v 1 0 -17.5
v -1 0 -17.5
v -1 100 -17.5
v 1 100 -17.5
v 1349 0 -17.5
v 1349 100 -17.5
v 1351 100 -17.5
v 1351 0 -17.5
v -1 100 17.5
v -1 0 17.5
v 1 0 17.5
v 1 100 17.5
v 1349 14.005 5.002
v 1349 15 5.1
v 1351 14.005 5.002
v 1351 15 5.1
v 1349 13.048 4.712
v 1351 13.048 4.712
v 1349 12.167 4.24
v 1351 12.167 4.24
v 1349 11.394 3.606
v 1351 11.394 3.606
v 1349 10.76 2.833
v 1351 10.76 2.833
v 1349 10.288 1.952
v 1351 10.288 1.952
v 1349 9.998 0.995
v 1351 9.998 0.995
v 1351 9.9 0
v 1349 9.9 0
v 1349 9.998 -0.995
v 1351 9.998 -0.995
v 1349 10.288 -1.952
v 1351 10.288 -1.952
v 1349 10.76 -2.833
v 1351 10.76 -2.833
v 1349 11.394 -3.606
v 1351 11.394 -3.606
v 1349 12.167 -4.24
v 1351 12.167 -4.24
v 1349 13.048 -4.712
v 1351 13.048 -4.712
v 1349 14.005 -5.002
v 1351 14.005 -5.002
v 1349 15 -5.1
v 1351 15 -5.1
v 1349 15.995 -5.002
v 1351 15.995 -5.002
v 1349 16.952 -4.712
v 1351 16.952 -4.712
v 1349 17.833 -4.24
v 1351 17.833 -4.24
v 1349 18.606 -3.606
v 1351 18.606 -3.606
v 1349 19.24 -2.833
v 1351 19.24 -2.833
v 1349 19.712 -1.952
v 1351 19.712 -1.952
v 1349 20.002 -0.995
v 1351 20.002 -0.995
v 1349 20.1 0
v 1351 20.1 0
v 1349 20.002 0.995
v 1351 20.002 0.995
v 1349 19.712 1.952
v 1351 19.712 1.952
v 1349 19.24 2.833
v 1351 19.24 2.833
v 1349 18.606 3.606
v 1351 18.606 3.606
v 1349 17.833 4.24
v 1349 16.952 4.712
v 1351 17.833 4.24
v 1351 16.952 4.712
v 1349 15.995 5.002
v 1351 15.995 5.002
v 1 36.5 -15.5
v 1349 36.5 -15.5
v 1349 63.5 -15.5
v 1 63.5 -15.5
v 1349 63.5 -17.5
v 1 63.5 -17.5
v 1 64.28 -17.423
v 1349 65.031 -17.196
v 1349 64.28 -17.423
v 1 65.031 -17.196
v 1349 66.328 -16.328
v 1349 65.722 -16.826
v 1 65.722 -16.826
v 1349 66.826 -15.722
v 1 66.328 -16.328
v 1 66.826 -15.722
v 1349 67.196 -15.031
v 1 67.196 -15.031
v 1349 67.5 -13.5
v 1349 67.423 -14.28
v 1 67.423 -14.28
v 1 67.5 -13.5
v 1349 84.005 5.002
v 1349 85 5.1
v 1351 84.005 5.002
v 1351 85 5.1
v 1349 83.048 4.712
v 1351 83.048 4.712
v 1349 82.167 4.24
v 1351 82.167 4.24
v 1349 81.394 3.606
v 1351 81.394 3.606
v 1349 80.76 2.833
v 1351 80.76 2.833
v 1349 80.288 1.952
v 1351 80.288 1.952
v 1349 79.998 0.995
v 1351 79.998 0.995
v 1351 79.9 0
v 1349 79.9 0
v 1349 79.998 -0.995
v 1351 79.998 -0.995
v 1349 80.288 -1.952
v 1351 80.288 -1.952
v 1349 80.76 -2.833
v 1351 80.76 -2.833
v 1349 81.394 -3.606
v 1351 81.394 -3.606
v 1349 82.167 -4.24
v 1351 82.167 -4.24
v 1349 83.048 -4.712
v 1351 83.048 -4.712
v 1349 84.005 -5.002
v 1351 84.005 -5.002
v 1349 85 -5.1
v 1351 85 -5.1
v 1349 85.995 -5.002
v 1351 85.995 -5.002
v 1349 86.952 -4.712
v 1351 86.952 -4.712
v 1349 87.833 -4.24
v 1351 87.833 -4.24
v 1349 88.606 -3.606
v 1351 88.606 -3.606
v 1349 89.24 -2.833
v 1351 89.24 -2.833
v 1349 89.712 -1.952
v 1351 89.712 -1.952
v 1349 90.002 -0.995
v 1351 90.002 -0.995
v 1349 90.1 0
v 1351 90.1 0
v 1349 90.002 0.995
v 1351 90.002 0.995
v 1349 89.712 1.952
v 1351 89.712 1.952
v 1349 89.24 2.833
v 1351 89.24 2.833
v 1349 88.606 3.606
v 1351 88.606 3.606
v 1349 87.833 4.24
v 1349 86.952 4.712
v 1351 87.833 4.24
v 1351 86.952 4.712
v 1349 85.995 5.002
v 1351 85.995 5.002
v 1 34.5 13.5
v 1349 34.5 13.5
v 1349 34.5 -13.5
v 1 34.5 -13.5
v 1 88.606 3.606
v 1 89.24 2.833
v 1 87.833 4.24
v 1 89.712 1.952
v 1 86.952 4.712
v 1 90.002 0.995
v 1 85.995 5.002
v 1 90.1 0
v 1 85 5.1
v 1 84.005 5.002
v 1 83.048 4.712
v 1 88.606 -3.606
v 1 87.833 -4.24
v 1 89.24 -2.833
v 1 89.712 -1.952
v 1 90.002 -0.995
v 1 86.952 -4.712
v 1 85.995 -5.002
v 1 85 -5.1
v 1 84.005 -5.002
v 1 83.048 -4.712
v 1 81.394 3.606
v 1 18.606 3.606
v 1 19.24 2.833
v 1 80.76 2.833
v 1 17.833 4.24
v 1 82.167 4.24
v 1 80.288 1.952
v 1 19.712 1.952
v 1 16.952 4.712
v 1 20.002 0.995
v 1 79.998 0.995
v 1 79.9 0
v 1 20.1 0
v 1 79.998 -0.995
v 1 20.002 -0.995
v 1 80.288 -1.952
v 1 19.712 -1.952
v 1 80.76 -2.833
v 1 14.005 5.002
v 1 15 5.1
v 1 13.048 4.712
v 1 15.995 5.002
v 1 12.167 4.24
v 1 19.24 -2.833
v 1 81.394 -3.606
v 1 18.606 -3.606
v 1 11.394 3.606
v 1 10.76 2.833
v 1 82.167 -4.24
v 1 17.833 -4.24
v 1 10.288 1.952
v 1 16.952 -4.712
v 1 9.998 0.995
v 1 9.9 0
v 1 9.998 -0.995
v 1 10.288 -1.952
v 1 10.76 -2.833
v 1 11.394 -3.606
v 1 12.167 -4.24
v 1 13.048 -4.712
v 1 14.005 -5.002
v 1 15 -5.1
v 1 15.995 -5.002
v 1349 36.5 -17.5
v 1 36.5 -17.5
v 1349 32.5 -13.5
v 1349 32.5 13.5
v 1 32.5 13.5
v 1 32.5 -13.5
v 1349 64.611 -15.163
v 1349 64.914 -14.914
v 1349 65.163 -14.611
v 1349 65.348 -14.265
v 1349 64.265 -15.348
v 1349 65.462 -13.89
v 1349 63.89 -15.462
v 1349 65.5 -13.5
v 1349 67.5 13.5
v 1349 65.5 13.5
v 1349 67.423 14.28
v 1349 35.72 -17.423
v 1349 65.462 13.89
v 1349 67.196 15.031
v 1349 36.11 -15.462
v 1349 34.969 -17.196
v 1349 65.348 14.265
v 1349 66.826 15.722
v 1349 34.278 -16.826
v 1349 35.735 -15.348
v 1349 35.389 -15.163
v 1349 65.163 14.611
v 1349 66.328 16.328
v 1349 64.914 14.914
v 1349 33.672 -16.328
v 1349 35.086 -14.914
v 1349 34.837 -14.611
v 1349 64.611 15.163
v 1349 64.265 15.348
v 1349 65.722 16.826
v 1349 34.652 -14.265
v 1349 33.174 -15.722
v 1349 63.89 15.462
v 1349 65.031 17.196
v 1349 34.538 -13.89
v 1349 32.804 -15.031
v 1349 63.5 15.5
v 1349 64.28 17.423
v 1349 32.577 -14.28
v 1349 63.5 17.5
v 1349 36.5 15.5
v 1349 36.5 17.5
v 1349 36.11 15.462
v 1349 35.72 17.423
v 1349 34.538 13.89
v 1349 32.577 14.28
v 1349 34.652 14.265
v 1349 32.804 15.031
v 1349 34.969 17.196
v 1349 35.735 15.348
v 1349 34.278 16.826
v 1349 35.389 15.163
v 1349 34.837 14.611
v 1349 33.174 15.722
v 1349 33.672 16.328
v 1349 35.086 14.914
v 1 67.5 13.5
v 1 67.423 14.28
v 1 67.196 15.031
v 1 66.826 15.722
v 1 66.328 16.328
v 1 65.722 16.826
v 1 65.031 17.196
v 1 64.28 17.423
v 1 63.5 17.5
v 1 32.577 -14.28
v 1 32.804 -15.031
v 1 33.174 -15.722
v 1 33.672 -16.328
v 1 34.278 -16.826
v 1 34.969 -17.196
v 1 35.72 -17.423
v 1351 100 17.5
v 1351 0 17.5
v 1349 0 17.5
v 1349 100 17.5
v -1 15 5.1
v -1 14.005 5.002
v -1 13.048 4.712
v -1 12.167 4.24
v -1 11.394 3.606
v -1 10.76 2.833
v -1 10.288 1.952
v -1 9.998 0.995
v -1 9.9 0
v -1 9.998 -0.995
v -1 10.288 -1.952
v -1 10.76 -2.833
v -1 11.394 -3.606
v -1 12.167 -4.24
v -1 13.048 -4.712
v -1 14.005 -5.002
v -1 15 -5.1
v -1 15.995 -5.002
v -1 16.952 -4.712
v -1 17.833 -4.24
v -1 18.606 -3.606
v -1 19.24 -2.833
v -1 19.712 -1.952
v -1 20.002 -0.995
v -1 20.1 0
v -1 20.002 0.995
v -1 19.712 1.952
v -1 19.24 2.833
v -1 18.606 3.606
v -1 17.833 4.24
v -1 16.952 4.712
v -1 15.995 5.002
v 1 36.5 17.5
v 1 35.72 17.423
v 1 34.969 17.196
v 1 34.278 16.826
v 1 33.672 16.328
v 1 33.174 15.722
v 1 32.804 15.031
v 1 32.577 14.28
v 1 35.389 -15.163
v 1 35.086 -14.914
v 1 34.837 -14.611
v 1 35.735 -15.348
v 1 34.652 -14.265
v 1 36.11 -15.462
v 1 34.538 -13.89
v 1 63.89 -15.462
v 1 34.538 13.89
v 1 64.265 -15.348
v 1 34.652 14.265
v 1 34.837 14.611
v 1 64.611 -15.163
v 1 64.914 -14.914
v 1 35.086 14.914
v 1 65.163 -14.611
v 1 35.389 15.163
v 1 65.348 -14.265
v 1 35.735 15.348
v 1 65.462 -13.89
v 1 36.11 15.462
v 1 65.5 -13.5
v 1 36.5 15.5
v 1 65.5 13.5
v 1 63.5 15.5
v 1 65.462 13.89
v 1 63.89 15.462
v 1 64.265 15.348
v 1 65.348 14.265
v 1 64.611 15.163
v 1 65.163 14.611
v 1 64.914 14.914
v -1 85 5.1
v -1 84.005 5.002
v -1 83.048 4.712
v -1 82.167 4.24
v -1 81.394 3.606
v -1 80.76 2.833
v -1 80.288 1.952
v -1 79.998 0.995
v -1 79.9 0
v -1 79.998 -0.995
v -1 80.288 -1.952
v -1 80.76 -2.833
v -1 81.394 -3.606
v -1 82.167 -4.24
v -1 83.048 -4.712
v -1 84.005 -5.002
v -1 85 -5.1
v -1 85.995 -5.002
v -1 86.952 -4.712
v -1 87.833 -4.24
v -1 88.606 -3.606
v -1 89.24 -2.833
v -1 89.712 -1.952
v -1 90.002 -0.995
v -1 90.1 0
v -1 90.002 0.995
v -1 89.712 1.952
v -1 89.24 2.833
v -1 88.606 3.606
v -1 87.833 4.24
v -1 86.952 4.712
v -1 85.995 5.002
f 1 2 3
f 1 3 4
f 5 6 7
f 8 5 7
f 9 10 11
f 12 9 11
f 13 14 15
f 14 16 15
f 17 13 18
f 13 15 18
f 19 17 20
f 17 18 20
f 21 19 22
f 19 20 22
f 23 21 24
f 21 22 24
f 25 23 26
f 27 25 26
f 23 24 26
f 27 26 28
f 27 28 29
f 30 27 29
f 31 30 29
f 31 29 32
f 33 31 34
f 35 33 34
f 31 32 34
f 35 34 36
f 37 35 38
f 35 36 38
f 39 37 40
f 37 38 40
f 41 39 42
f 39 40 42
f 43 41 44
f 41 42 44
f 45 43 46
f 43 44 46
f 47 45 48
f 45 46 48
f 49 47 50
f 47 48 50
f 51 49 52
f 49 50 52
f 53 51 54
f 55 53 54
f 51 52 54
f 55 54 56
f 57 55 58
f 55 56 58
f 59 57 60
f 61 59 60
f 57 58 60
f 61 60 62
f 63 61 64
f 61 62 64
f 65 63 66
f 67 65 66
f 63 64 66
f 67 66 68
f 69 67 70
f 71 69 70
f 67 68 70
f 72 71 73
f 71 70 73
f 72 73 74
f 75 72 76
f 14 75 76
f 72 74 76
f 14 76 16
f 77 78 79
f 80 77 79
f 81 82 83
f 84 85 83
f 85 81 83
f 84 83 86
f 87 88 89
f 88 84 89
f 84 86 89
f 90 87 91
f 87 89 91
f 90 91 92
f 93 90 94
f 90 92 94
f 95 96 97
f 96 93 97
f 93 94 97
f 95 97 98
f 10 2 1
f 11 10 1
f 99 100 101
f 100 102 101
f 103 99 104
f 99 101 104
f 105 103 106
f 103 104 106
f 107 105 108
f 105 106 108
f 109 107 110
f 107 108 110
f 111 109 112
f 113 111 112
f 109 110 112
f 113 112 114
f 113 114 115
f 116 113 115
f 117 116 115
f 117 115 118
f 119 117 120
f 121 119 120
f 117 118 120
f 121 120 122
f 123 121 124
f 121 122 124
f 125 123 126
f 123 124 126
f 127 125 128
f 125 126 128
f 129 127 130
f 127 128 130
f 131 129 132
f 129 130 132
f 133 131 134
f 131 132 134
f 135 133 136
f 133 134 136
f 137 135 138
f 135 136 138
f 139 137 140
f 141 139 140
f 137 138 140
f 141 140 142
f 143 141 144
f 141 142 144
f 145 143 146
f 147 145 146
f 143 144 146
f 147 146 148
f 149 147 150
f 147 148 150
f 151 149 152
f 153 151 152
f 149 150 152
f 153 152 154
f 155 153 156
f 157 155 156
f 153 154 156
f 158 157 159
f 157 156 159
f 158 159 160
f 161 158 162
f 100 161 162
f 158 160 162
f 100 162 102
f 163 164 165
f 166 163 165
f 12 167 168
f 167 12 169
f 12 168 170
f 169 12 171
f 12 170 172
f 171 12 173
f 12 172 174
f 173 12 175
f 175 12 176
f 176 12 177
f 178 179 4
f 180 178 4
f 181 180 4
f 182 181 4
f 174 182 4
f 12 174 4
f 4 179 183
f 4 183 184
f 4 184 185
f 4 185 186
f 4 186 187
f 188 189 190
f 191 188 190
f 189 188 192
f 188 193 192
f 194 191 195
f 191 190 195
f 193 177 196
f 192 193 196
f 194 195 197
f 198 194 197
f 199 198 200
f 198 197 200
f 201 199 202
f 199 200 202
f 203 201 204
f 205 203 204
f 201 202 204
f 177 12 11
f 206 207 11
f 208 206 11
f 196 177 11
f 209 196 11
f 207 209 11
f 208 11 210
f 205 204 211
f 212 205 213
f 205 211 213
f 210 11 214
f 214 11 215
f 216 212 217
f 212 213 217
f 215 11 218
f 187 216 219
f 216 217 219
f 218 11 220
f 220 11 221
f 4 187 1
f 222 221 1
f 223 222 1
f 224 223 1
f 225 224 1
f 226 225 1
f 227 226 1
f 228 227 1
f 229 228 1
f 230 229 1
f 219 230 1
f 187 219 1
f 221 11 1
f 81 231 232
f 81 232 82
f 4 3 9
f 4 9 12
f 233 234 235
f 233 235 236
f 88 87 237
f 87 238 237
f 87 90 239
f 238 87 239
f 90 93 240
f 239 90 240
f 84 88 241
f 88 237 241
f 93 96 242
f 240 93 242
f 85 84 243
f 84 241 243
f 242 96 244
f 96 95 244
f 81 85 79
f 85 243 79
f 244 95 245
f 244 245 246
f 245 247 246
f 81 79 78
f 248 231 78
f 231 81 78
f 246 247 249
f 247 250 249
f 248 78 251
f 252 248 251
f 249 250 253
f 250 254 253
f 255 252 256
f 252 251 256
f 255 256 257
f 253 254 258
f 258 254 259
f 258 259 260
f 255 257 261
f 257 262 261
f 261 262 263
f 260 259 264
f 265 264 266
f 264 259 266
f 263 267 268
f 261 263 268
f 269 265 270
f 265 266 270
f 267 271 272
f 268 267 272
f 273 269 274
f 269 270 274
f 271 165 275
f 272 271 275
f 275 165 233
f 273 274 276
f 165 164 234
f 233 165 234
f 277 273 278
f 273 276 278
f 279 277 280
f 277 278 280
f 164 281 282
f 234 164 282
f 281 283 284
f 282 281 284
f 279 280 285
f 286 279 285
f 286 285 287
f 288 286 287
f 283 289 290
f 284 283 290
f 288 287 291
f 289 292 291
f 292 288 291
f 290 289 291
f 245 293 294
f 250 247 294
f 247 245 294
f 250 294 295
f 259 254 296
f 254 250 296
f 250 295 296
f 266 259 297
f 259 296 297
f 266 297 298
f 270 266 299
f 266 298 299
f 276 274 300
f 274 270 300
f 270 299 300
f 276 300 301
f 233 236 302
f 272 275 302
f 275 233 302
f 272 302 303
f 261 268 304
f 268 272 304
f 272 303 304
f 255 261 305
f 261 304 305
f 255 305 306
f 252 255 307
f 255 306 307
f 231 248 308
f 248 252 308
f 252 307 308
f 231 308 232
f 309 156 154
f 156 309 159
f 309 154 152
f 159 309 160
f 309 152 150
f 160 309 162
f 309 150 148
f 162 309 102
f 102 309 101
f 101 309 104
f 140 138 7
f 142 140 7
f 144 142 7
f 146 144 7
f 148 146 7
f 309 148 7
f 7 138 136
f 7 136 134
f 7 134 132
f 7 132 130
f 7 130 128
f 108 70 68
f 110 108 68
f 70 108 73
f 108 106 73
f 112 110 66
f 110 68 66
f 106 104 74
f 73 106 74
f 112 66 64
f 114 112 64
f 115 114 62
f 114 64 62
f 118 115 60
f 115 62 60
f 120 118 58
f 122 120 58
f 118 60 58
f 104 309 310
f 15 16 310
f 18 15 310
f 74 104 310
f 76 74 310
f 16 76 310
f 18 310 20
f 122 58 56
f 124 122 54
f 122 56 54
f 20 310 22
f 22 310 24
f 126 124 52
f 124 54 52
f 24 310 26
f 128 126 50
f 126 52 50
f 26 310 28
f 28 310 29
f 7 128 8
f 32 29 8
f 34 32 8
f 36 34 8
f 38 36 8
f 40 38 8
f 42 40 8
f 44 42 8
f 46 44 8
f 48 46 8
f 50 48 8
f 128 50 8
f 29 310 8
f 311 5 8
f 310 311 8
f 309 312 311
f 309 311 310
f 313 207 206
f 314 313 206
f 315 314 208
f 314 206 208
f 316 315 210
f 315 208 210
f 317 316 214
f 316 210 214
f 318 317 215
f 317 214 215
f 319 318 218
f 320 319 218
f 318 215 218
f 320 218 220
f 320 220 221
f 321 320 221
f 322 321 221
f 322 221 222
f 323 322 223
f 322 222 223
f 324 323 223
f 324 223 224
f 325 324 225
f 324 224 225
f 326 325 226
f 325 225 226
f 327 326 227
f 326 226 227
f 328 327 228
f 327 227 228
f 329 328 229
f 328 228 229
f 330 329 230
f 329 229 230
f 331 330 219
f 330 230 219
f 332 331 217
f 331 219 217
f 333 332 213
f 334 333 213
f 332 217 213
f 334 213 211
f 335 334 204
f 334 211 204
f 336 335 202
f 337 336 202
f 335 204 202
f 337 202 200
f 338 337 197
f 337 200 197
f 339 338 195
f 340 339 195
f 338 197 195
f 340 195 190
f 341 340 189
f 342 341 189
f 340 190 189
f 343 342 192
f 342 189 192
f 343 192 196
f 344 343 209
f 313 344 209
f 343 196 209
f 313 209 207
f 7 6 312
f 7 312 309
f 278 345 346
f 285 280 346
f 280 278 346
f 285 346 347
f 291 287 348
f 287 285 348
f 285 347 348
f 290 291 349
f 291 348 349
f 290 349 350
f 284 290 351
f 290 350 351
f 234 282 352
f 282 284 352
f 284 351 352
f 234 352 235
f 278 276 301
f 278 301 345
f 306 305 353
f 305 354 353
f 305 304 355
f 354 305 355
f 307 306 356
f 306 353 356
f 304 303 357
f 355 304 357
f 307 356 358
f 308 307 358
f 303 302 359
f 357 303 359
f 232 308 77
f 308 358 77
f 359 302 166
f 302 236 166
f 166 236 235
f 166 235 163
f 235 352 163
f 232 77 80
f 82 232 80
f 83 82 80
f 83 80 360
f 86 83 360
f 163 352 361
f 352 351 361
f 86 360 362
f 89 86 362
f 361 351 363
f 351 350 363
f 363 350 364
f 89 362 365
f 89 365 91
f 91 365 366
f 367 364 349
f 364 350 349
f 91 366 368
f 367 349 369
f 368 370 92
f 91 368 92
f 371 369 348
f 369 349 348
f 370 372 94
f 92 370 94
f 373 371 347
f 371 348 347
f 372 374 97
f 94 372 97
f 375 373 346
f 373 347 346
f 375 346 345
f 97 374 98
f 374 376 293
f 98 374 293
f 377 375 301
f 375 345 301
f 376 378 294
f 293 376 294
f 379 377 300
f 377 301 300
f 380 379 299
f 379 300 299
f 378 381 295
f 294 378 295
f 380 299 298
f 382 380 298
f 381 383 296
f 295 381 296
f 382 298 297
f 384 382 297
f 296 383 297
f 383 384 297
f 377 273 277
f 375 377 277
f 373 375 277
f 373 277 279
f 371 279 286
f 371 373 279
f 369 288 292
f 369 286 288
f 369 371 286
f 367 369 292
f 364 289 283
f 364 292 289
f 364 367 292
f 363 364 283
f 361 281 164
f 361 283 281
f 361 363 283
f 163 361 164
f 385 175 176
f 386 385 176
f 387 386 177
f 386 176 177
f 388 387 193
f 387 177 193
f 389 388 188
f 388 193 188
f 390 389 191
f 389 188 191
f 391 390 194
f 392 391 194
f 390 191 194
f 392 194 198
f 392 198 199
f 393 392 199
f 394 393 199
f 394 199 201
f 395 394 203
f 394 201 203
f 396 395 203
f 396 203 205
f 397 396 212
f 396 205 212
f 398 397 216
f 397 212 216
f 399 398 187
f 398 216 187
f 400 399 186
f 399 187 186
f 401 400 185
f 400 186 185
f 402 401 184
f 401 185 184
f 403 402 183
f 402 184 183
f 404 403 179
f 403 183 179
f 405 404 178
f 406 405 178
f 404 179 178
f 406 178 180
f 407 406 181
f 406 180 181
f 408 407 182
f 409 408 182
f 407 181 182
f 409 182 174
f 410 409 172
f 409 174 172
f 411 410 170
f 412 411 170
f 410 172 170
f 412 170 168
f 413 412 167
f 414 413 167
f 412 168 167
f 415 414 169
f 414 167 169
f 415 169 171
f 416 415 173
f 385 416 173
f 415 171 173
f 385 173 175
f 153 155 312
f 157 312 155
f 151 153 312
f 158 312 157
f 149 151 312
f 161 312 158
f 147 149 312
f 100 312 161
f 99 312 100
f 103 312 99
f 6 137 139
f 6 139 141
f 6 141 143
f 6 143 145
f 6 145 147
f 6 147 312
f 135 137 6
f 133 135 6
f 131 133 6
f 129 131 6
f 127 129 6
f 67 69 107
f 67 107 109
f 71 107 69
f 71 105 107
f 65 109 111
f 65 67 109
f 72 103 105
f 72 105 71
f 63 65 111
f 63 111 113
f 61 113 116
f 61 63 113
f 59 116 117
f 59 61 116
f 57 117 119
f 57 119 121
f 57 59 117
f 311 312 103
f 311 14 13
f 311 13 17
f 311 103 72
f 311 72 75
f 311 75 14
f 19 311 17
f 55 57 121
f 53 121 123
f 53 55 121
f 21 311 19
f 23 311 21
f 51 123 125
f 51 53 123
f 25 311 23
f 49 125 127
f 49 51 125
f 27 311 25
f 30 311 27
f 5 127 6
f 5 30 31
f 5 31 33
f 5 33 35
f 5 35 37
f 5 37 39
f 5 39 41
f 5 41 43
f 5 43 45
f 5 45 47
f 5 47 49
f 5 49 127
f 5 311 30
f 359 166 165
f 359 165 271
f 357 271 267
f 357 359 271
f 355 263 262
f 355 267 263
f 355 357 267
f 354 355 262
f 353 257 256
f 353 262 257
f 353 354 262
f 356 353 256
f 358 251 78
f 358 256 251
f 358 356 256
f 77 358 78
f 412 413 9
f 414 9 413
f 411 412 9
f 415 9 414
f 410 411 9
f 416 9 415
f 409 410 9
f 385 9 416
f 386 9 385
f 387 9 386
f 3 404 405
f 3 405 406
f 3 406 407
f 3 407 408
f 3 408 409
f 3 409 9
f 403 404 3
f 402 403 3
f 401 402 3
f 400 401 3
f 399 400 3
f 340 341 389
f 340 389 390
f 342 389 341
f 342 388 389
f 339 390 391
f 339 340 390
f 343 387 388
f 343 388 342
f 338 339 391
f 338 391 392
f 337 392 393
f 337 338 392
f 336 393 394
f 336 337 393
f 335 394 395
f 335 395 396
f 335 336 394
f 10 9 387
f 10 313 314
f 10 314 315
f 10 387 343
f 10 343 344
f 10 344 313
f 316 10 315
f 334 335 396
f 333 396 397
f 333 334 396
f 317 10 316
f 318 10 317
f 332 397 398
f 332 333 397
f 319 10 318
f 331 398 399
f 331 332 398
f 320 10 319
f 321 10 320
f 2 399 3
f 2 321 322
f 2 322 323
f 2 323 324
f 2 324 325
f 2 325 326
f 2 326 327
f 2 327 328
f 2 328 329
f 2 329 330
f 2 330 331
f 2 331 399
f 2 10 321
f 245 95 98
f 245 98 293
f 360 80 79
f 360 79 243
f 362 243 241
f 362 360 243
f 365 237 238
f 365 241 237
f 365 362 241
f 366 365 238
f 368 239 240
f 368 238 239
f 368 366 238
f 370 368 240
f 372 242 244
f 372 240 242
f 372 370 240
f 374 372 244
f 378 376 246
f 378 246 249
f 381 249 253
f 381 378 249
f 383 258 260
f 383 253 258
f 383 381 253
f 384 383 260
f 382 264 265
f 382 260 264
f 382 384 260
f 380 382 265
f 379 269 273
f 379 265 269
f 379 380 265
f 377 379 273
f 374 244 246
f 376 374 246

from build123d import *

# Parameters (mm, degrees)
SKETCH1_W                                    = 2
SKETCH1_H                                    = 35
SQUARE_TUBE_CONFIGURED_20_X_20_X_2_1_DEPTH   = 100
SKETCH1_ON_SEGMENT_2_W                       = 2
SKETCH1_ON_SEGMENT_2_H                       = 35
SQUARE_TUBE_CONFIGURED_20_X_20_X_2_1_2_DEPTH = 100
SQUARE_TUBE_CONFIGURED_20_X_20_X_2_3_DEPTH   = 1350
SKETCH13_W                                   = 5.1
SKETCH13_H                                   = 1352
F_10_2_10_2_DIAMETER_HOLE1_AT_2_COUNT        = 2
F_10_2_10_2_DIAMETER_HOLE1_AT_2_PITCH        = 70


with BuildPart() as part:
    # Sketch1 → Square tube - configured 20 X 20 X 2(1) (new body)
    with BuildSketch(Plane(origin=(0, 0, 0), x_dir=(1, 0, 0), z_dir=(0, 1, 0))):
        Rectangle(SKETCH1_W, SKETCH1_H)
    extrude(amount=SQUARE_TUBE_CONFIGURED_20_X_20_X_2_1_DEPTH)


with BuildPart() as body_2:
    # Sketch1 on segment 2 (carried to segment 2) → Square tube - configured 20 X 20 X 2_1 2 (new body)
    with BuildSketch(Plane(origin=(1350, 0, 0), x_dir=(1, 0, 0), z_dir=(0, 1, 0))):
        Rectangle(SKETCH1_ON_SEGMENT_2_W, SKETCH1_ON_SEGMENT_2_H)
    extrude(amount=SQUARE_TUBE_CONFIGURED_20_X_20_X_2_1_2_DEPTH)


with BuildPart() as body_3:
    # Sketch11 → Square tube - configured 20 X 20 X 2(3) (new body)
    with BuildSketch(Plane(origin=(0, 50, 0), x_dir=(0, 0, -1), z_dir=(1, 0, 0))):
        with BuildLine():
            Line((-13.5, -17.5), (13.5, -17.5))
            ThreePointArc((13.5, -17.5), (16.328427125, -16.328427125), (17.5, -13.5))
            Line((17.5, -13.5), (17.5, 13.5))
            ThreePointArc((17.5, 13.5), (16.328427125, 16.328427125), (13.5, 17.5))
            Line((13.5, 17.5), (-13.5, 17.5))
            ThreePointArc((-13.5, 17.5), (-16.328427125, 16.328427125), (-17.5, 13.5))
            Line((-17.5, 13.5), (-17.5, -13.5))
            ThreePointArc((-17.5, -13.5), (-16.328427125, -16.328427125), (-13.5, -17.5))
        make_face()
        with BuildLine():
            Line((-13.5, -15.5), (13.5, -15.5))
            ThreePointArc((13.5, -15.5), (14.914213562, -14.914213562), (15.5, -13.5))
            Line((15.5, -13.5), (15.5, 13.5))
            ThreePointArc((15.5, 13.5), (14.914213562, 14.914213562), (13.5, 15.5))
            Line((13.5, 15.5), (-13.5, 15.5))
            ThreePointArc((-13.5, 15.5), (-14.914213562, 14.914213562), (-15.5, 13.5))
            Line((-15.5, 13.5), (-15.5, -13.5))
            ThreePointArc((-15.5, -13.5), (-14.914213562, -14.914213562), (-13.5, -15.5))
        make_face(mode=Mode.SUBTRACT)
    extrude(amount=SQUARE_TUBE_CONFIGURED_20_X_20_X_2_3_DEPTH)

    # Trim/Extend1
    split(bisect_by=Plane(origin=(1349, 50, 0), x_dir=(0, -1, 0), z_dir=(-1, 0, 0)), keep=Keep.TOP)

    # Trim/Extend2
    split(bisect_by=Plane(origin=(1, 50, 0), x_dir=(0, 1, 0), z_dir=(1, 0, 0)), keep=Keep.TOP)


with BuildPart() as f_10_2_10_2_diameter_hole1_tool:
    # Sketch13 → Ø10.2 (10.2) Diameter Hole1 (revolve)
    with BuildSketch(Plane(origin=(-1, 15, 0), x_dir=(0, 0, 1), z_dir=(0, 1, 0))):
        with Locations((2.55, 676)):
            Rectangle(SKETCH13_W, SKETCH13_H)
    f_10_2_10_2_diameter_hole1 = revolve(axis=Axis((-7.35, 15, 0), (1, 0, 0)))


with BuildPart() as part_1:
    add(part.part)

    # Ø10.2 (10.2) Diameter Hole1: cut by f_10_2_10_2_diameter_hole1_tool
    add(f_10_2_10_2_diameter_hole1_tool.part, mode=Mode.SUBTRACT)


with BuildPart() as body_2_1:
    add(body_2.part)

    # Ø10.2 (10.2) Diameter Hole1: cut by f_10_2_10_2_diameter_hole1_tool
    add(f_10_2_10_2_diameter_hole1_tool.part, mode=Mode.SUBTRACT)


with BuildPart() as f_10_2_10_2_diameter_hole1_at_2_tool:
    # Ø10.2 (10.2) Diameter Hole1 at 2: Ø10.2 (10.2) Diameter Hole1 ×2
    with Locations(*[(0, i * F_10_2_10_2_DIAMETER_HOLE1_AT_2_PITCH, 0) for i in range(1, F_10_2_10_2_DIAMETER_HOLE1_AT_2_COUNT)]):
        add(f_10_2_10_2_diameter_hole1)


with BuildPart() as part_2:
    add(part_1.part)

    # Ø10.2 (10.2) Diameter Hole1 at 2: cut by f_10_2_10_2_diameter_hole1_at_2_tool
    add(f_10_2_10_2_diameter_hole1_at_2_tool.part, mode=Mode.SUBTRACT)


with BuildPart() as body_2_2:
    add(body_2_1.part)

    # Ø10.2 (10.2) Diameter Hole1 at 2: cut by f_10_2_10_2_diameter_hole1_at_2_tool
    add(f_10_2_10_2_diameter_hole1_at_2_tool.part, mode=Mode.SUBTRACT)


solid = Compound([body_3.part, part_2.part, body_2_2.part])
